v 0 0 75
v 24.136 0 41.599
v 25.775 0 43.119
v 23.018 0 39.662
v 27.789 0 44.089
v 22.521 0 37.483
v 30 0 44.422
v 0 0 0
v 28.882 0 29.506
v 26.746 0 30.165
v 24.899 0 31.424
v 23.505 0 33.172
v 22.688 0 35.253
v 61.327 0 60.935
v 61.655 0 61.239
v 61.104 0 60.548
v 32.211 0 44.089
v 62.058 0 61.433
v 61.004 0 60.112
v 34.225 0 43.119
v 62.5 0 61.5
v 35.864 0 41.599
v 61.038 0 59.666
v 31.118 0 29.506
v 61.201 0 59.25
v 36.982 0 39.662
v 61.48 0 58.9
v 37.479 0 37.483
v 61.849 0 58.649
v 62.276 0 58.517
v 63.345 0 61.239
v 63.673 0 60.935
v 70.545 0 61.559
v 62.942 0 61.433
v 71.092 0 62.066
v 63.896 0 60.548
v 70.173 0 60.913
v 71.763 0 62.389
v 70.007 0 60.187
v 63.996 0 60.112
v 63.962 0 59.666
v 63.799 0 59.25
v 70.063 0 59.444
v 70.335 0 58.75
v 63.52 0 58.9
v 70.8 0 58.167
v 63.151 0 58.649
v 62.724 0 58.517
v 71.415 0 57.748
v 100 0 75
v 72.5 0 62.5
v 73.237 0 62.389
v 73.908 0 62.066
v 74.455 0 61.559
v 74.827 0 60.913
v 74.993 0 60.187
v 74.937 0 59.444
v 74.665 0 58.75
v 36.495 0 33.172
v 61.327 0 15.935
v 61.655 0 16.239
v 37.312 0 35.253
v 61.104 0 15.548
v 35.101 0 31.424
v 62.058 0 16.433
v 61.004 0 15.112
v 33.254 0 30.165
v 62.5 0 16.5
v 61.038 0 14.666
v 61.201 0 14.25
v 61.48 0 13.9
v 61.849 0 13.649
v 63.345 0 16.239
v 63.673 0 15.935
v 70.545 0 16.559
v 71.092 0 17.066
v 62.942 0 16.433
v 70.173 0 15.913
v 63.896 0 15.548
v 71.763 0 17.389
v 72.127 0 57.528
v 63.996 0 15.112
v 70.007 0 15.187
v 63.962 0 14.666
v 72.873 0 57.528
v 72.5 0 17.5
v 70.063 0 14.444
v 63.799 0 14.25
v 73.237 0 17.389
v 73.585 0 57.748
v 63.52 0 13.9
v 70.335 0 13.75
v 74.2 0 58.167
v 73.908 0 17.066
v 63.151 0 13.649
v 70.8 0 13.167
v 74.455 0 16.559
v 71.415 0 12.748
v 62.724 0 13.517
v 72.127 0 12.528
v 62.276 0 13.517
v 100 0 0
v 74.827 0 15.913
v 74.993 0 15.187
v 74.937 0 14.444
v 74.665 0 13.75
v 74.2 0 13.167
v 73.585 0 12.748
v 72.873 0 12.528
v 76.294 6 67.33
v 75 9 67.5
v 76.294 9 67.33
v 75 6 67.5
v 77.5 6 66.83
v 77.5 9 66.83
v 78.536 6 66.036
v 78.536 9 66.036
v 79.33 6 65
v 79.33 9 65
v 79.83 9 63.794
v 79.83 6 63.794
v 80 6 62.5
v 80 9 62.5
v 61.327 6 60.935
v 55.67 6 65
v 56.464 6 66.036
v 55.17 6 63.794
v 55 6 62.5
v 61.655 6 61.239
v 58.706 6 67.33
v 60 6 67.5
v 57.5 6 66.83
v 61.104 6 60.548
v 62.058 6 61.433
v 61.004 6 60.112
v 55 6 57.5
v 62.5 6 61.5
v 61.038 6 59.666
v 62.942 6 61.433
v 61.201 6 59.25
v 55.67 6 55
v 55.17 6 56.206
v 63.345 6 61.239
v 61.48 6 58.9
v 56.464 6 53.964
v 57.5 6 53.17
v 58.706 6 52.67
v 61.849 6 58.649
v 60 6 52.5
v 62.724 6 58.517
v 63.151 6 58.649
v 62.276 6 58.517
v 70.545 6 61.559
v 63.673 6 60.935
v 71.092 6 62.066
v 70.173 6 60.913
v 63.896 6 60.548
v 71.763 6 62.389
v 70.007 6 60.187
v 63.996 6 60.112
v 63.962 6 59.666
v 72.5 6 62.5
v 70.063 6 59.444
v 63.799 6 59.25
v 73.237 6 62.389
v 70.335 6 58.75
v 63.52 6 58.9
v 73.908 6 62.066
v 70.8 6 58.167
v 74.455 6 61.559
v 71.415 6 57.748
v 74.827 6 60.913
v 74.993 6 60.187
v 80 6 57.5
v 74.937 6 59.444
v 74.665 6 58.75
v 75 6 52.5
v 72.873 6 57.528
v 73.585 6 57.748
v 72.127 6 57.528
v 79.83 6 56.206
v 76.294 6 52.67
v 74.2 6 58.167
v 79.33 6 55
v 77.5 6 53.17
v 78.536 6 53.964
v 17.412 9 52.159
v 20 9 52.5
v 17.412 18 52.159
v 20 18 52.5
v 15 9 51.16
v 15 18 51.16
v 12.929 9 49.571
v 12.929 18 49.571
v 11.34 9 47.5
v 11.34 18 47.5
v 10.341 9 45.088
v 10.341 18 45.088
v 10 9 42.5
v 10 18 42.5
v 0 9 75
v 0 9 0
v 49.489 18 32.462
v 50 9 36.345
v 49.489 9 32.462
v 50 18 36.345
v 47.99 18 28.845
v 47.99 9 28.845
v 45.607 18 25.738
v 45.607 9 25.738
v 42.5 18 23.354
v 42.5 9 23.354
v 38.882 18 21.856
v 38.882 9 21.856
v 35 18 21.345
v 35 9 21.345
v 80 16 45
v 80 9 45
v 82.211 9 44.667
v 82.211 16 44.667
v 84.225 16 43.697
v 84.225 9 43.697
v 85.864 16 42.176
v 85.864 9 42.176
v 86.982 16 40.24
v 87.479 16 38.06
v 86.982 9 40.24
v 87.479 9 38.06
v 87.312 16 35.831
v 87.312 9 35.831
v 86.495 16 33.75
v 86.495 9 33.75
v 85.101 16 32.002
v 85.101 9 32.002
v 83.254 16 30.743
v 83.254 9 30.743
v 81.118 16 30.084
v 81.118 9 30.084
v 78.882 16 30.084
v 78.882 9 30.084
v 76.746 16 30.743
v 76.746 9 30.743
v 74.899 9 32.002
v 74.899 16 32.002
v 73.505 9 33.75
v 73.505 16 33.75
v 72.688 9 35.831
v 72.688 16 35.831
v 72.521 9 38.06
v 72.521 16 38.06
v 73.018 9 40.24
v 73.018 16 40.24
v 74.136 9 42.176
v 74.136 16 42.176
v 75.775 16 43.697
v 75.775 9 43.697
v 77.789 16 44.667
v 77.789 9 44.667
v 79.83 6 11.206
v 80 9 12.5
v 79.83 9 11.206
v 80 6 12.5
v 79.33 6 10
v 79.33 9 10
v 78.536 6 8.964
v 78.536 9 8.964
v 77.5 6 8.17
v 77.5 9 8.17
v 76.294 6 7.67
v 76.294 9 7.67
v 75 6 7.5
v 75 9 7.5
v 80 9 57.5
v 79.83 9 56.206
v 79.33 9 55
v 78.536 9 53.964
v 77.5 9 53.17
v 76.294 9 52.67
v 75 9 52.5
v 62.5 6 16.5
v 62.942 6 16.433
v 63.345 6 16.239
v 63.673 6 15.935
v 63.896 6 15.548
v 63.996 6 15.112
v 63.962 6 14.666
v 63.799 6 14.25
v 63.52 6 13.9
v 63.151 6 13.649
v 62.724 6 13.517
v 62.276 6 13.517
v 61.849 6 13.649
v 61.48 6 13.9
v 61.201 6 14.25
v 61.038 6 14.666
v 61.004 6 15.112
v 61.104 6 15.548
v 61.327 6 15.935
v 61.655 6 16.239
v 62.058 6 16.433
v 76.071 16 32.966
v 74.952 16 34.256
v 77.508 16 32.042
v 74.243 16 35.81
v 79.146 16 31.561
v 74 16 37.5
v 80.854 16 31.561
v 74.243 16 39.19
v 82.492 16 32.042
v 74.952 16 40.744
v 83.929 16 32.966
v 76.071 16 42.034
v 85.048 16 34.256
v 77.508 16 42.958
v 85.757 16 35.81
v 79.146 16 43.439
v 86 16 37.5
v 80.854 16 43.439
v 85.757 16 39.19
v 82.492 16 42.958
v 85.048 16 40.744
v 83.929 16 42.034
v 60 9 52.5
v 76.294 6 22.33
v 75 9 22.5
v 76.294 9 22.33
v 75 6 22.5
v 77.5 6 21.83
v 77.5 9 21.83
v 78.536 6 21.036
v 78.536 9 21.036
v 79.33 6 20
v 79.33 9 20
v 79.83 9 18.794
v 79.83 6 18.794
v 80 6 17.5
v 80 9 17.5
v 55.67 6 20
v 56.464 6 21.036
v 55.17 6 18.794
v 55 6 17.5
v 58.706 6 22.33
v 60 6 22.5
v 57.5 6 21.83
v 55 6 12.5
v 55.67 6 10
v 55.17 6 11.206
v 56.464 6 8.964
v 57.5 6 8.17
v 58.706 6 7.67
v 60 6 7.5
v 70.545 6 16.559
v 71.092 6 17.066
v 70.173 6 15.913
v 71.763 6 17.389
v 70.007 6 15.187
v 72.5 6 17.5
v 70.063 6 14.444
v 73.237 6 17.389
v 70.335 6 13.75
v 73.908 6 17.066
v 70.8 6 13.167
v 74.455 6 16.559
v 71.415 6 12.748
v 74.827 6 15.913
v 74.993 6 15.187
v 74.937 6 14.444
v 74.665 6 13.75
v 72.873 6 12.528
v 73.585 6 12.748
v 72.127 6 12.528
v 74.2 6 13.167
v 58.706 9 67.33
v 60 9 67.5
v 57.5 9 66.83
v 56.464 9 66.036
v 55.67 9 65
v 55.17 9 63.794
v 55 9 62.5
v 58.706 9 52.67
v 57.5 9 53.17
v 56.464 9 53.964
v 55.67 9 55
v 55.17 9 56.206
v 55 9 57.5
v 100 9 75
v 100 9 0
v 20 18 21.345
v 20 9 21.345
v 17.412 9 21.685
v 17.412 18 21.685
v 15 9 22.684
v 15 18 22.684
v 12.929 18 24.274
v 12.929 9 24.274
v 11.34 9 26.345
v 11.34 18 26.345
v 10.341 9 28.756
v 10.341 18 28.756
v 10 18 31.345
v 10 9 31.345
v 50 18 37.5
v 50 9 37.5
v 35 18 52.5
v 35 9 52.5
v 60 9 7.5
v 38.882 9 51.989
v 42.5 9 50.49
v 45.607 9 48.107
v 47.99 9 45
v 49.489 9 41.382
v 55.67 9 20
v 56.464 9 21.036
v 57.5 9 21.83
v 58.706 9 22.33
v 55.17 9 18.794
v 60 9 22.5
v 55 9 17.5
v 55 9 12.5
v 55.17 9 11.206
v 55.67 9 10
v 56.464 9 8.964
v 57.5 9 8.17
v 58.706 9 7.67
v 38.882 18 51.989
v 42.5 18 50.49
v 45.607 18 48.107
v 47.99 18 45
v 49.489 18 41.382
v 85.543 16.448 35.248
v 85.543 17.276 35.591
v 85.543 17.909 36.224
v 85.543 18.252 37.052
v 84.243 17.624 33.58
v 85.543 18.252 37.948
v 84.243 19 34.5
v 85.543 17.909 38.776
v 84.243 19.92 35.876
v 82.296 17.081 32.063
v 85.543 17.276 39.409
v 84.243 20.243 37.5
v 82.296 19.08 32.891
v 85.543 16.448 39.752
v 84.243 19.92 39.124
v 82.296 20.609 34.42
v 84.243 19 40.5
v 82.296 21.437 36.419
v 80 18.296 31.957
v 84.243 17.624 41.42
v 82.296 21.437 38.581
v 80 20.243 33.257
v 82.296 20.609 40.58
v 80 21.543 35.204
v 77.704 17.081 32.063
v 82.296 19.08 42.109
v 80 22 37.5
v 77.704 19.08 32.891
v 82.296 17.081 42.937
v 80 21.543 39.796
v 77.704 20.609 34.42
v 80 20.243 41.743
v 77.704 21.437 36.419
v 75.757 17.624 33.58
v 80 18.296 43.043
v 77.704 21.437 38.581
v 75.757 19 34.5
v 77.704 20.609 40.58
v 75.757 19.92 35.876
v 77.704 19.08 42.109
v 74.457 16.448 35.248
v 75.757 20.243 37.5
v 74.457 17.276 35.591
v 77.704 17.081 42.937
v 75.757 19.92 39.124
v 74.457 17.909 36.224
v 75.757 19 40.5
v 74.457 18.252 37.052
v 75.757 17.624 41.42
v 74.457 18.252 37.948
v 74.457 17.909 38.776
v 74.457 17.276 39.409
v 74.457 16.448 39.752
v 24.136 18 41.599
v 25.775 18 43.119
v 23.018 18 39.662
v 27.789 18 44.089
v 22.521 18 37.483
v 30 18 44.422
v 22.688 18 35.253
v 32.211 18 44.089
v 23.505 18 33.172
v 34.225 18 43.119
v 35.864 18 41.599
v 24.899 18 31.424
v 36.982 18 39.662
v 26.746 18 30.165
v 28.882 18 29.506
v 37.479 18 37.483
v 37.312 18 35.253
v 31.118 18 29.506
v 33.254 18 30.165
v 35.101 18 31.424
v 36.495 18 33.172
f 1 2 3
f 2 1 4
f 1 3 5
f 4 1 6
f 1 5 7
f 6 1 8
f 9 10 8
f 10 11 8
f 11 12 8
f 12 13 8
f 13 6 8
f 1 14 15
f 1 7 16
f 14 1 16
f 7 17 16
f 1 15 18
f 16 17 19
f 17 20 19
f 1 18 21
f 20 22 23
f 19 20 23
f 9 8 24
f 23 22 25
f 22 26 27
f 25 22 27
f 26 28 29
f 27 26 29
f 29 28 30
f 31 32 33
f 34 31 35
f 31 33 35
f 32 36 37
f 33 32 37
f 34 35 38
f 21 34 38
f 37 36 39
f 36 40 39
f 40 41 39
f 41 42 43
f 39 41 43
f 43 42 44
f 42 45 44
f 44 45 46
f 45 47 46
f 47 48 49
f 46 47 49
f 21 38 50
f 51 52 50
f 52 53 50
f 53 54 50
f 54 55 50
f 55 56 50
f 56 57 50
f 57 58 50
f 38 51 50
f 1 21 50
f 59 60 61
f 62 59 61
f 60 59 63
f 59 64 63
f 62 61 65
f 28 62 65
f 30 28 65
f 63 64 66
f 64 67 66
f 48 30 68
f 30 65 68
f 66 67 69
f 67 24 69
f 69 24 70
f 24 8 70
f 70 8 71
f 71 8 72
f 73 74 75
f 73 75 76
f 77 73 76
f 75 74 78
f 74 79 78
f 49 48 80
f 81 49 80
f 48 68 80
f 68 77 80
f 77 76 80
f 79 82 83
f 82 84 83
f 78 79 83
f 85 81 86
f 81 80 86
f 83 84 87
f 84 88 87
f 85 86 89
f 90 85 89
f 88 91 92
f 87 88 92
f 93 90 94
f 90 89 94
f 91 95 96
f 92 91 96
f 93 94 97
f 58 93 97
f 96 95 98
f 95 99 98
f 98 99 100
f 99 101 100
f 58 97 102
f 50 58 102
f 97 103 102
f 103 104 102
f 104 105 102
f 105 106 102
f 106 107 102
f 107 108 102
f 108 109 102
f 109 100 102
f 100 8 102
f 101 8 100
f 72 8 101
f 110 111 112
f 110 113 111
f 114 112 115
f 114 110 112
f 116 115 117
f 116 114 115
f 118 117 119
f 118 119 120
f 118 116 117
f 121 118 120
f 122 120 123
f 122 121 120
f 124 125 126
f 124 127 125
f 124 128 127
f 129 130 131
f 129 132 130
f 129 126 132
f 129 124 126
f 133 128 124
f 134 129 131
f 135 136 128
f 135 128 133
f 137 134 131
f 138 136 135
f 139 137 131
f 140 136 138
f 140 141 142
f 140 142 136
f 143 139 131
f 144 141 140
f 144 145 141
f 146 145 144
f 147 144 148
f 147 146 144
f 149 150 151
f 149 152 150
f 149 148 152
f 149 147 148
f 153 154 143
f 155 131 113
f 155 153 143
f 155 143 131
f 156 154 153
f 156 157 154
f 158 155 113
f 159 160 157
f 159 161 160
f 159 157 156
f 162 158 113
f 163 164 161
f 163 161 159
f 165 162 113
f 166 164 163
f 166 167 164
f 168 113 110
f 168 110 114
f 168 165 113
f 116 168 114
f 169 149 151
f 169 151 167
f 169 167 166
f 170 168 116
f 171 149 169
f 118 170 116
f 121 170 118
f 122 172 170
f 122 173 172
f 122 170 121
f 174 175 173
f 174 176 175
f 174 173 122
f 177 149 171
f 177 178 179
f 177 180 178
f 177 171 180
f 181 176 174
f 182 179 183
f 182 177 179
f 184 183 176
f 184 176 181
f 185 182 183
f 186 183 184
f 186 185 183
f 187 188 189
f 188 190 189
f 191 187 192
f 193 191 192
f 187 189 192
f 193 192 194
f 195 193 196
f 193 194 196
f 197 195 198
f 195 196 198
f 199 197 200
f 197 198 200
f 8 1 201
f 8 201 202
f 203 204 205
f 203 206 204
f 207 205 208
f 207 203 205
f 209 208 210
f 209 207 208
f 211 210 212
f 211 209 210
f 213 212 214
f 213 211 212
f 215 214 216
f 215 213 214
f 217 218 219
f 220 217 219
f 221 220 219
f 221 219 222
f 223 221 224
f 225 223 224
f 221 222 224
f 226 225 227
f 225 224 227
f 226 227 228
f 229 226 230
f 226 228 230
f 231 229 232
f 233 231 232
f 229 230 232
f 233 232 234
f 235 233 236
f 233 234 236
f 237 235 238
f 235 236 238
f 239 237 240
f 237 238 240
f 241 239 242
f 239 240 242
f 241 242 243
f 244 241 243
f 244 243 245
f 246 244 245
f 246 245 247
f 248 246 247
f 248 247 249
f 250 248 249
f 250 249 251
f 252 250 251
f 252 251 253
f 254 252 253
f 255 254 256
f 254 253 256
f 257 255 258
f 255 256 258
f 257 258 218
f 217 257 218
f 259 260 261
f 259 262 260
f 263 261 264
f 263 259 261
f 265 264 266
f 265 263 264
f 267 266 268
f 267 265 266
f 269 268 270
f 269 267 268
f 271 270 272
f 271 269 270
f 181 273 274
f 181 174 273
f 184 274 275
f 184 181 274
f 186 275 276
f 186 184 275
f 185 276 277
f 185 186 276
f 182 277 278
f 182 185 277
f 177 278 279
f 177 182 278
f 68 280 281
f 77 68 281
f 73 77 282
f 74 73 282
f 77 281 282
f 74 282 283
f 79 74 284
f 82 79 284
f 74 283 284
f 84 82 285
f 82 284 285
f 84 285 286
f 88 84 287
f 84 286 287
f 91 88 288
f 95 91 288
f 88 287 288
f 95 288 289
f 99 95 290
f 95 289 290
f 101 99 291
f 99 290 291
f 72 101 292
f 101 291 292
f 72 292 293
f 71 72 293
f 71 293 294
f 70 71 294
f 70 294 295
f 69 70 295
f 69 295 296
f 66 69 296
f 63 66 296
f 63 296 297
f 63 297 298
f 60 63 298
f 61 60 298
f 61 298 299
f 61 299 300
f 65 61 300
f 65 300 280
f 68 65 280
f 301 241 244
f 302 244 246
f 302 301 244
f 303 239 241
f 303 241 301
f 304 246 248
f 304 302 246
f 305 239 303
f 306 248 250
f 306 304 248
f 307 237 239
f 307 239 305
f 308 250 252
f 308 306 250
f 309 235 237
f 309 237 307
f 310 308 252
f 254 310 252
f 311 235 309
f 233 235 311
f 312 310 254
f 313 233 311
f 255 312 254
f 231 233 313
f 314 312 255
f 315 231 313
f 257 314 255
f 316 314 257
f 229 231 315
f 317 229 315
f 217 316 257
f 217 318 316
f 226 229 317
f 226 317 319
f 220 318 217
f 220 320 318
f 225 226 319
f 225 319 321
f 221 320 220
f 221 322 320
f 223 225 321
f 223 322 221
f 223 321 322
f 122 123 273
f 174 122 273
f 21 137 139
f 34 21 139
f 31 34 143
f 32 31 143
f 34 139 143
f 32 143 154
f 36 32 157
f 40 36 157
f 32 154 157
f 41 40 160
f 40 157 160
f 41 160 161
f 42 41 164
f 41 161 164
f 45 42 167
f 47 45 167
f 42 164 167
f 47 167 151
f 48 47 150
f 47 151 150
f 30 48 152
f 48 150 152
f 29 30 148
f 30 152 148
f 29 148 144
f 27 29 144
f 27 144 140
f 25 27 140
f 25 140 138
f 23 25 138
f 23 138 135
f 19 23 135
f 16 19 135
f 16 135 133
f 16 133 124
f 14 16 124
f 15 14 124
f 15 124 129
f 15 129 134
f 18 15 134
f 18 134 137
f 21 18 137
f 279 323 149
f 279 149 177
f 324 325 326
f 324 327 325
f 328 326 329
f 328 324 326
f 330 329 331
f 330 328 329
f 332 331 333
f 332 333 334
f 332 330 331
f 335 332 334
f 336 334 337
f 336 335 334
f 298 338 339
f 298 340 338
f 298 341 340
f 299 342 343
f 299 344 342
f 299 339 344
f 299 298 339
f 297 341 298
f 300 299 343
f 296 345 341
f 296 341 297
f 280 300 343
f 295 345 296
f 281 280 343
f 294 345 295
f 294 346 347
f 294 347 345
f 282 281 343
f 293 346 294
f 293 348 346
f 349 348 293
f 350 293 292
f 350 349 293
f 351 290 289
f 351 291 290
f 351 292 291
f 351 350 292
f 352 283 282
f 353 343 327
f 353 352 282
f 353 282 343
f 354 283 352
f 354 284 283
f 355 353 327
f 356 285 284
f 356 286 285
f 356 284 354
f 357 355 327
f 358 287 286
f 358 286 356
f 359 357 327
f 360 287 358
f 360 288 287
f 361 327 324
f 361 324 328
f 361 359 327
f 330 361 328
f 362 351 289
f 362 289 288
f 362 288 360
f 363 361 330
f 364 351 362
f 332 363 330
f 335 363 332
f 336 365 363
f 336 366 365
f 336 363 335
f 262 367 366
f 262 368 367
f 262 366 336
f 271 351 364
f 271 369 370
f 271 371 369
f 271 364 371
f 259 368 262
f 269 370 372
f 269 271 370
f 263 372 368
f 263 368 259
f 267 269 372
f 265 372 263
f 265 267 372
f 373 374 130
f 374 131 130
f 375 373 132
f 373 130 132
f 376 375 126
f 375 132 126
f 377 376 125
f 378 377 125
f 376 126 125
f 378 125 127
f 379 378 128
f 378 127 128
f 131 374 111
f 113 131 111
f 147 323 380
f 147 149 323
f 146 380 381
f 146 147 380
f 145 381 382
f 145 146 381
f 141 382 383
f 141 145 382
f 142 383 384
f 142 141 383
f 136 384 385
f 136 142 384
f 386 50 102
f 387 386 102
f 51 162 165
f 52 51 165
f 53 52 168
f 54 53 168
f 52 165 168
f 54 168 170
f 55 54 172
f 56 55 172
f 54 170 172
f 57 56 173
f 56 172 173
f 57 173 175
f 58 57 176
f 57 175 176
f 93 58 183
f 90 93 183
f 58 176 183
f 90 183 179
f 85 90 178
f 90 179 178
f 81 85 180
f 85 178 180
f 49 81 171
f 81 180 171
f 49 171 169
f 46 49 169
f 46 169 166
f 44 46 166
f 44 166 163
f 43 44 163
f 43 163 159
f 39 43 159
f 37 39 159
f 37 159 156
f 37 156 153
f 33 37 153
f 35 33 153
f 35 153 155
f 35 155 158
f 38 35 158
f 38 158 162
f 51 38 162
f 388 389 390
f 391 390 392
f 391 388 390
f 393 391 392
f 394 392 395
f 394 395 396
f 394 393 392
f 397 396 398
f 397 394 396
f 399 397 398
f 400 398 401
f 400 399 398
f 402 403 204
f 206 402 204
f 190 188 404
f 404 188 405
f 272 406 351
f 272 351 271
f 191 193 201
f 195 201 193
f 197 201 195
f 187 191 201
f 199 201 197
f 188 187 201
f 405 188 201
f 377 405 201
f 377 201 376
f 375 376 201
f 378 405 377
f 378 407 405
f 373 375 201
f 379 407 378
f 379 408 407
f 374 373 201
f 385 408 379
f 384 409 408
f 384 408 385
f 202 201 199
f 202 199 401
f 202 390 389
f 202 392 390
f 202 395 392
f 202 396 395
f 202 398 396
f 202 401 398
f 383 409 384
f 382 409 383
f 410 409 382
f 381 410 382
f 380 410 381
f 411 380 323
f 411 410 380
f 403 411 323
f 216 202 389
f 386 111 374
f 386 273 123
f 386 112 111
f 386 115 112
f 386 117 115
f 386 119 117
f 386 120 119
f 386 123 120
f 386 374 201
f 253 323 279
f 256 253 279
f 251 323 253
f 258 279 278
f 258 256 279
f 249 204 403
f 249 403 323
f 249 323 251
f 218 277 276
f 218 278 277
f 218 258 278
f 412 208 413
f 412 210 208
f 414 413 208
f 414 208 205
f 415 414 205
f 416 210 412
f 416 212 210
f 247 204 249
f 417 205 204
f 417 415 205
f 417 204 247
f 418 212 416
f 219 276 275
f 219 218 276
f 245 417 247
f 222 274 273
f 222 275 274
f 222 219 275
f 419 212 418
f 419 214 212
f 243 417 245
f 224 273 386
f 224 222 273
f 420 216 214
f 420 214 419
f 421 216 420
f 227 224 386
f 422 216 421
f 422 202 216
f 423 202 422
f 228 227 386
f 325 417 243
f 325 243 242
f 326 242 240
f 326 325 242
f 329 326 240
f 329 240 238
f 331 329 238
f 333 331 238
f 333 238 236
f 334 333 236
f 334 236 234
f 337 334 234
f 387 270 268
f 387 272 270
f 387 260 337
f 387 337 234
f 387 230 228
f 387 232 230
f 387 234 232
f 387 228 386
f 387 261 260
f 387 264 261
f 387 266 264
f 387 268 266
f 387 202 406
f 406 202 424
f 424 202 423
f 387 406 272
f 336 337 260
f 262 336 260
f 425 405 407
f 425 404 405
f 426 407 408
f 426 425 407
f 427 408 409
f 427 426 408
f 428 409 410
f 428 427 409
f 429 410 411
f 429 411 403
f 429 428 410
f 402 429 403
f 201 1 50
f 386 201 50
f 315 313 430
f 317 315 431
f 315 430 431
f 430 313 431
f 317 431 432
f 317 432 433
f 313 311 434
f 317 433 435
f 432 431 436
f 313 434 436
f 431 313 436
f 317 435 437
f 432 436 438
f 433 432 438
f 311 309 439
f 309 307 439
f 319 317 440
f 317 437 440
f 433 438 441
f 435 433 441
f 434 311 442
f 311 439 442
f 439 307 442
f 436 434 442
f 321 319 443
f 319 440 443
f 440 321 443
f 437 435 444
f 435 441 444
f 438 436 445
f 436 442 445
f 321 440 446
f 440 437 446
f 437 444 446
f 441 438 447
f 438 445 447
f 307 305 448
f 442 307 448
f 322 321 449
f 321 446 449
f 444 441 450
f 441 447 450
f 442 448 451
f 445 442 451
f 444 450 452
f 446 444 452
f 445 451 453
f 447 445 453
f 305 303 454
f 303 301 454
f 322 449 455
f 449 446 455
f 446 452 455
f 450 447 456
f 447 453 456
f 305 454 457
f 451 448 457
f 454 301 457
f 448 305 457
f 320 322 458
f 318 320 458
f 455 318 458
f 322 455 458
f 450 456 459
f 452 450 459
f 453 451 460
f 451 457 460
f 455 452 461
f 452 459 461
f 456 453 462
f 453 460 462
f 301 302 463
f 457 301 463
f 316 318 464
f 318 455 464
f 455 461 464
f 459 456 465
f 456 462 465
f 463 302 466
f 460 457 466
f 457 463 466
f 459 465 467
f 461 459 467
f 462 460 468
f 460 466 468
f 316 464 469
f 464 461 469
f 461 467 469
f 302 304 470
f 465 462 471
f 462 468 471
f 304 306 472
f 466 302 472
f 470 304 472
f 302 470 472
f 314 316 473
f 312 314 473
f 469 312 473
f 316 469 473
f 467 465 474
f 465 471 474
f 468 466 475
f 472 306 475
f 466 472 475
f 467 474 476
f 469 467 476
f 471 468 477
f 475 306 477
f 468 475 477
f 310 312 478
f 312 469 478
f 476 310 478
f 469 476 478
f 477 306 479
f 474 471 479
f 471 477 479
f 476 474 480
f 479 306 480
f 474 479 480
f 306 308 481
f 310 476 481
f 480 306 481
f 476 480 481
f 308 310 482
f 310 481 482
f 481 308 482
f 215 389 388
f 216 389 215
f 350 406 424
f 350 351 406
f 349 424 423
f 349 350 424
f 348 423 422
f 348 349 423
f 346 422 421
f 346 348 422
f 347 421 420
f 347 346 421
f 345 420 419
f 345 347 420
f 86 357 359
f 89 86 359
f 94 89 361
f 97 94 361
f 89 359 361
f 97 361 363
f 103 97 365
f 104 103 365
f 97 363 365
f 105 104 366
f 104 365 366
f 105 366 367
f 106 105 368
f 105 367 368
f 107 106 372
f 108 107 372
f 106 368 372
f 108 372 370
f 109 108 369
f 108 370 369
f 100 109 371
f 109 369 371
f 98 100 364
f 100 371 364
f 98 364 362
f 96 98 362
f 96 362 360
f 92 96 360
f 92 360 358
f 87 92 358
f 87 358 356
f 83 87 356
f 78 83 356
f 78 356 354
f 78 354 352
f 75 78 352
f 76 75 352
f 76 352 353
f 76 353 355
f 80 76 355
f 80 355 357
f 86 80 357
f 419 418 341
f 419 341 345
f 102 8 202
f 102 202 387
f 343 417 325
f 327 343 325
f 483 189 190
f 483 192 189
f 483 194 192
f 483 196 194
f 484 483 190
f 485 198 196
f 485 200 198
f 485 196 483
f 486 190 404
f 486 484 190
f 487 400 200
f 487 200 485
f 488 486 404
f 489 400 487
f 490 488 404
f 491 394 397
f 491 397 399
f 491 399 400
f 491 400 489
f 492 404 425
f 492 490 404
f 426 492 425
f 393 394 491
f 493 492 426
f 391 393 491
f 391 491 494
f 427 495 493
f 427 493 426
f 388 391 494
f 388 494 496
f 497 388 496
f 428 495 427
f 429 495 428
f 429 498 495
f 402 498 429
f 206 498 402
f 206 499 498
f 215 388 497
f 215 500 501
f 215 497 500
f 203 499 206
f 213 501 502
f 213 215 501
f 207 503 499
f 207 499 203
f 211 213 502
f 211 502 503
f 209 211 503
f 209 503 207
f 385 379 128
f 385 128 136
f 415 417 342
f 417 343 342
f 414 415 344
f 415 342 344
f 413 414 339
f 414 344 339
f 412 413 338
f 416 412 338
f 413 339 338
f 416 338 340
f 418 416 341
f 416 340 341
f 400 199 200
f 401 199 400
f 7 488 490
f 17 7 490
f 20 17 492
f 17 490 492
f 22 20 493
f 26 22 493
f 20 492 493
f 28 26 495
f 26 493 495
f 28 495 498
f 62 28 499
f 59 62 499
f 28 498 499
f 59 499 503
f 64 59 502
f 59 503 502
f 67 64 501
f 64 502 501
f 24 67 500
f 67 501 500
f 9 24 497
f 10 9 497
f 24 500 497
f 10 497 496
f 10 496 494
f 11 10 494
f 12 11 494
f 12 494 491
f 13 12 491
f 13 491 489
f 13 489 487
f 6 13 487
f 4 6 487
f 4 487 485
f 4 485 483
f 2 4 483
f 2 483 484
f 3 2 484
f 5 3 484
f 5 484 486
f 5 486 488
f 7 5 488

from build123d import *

# Parameters (mm, degrees)
SKETCH1_W           = 100
SKETCH1_H           = 75
BOSS_EXTRUDE1_DEPTH = 9
SKETCH2_W           = 40
SKETCH2_H           = 31.155322697
BOSS_EXTRUDE2_DEPTH = 9
FILLET1_R           = 10
FILLET2_R           = 15
SKETCH3_R           = 7.5
CUT_EXTRUDE1_DEPTH  = 127.289350303
SKETCH4_W           = 25
SKETCH4_H           = 15
CUT_EXTRUDE2_DEPTH  = 3
FILLET3_R           = 5
SKETCH5_R           = 1.5
SKETCH5_R_2         = 2.5
CUT_EXTRUDE3_DEPTH  = 7
SKETCH6_R           = 7.5
BOSS_EXTRUDE3_DEPTH = 7


with BuildPart() as part:
    # Sketch1 → Boss-Extrude1 (new body)
    with BuildSketch(Plane(origin=(0, 0, 0), x_dir=(1, 0, 0), z_dir=(0, 1, 0))):
        with Locations((50, -37.5)):
            Rectangle(SKETCH1_W, SKETCH1_H)
    extrude(amount=BOSS_EXTRUDE1_DEPTH)

    # Sketch2 → Boss-Extrude2 (add)
    with BuildSketch(Plane(origin=(0, 9, 0), x_dir=(1, 0, 0), z_dir=(0, 1, 0))):
        with Locations((30, -36.922338651)):
            Rectangle(SKETCH2_W, SKETCH2_H)
    extrude(amount=BOSS_EXTRUDE2_DEPTH)

    # Fillet1
    fillet1_edges = [part.edges().sort_by_distance(p)[0] for p in [
        (10, 13.5, 21.344677303),
        (10, 13.5, 52.5),
    ]]
    fillet(fillet1_edges, radius=FILLET1_R)

    # Fillet2
    fillet2_edges = [part.edges().sort_by_distance(p)[0] for p in [
        (50, 13.5, 52.5),
        (50, 13.5, 21.344677303),
    ]]
    fillet(fillet2_edges, radius=FILLET2_R)

    # Sketch3 → Cut-Extrude1 (cut, through all)
    with BuildSketch(Plane(origin=(0, 18, 0), x_dir=(1, 0, 0), z_dir=(0, 1, 0))):
        with Locations(Location((30, -36.922338651, 0), (0, 0, 270))):
            Circle(SKETCH3_R)
    extrude(amount=-CUT_EXTRUDE1_DEPTH, mode=Mode.SUBTRACT)

    # Sketch4 → Cut-Extrude2 (cut)
    with BuildSketch(Plane(origin=(0, 9, 0), x_dir=(1, 0, 0), z_dir=(0, 1, 0))):
        with Locations((67.5, -60)):
            Rectangle(SKETCH4_W, SKETCH4_H)
        with Locations((67.5, -15)):
            Rectangle(SKETCH4_W, SKETCH4_H)
    extrude(amount=-CUT_EXTRUDE2_DEPTH, mode=Mode.SUBTRACT)

    # Fillet3
    fillet3_edges = [part.edges().sort_by_distance(p)[0] for p in [
        (55, 7.5, 67.5),
        (55, 7.5, 52.5),
        (80, 7.5, 52.5),
        (80, 7.5, 67.5),
        (80, 7.5, 22.5),
        (55, 7.5, 22.5),
        (55, 7.5, 7.5),
        (80, 7.5, 7.5),
    ]]
    fillet(fillet3_edges, radius=FILLET3_R)

    # Sketch5 → Cut-Extrude3 (cut)
    with BuildSketch(Plane(origin=(0, 6, 0), x_dir=(1, 0, 0), z_dir=(0, 1, 0))):
        with Locations(Location((62.5, -60, 0), (0, 0, 270))):
            Circle(SKETCH5_R)
        with Locations(Location((72.5, -60, 0), (0, 0, 270))):
            Circle(SKETCH5_R_2)
        with Locations(Location((72.5, -15, 0), (0, 0, 270))):
            Circle(SKETCH5_R_2)
        with Locations(Location((62.5, -15, 0), (0, 0, 270))):
            Circle(SKETCH5_R)
    extrude(amount=-CUT_EXTRUDE3_DEPTH, mode=Mode.SUBTRACT)

    # Sketch6 → Boss-Extrude3 (add)
    with BuildSketch(Plane(origin=(0, 9, 0), x_dir=(1, 0, 0), z_dir=(0, 1, 0))):
        with Locations(Location((80, -37.5, 0), (0, 0, 270))):
            Circle(SKETCH6_R)
    extrude(amount=BOSS_EXTRUDE3_DEPTH)

    # Sketch7 → Revolve1 (revolve)
    with BuildSketch(Plane(origin=(0, 16, 0), x_dir=(1, 0, 0), z_dir=(0, 1, 0))):
        with BuildLine():
            Line((74, -37.5), (86, -37.5))
            ThreePointArc((86, -37.5), (80, -43.5), (74, -37.5))
        make_face()
    revolve(axis=Axis((72.5, 16, 37.5), (1, 0, 0)))


solid = part.part
